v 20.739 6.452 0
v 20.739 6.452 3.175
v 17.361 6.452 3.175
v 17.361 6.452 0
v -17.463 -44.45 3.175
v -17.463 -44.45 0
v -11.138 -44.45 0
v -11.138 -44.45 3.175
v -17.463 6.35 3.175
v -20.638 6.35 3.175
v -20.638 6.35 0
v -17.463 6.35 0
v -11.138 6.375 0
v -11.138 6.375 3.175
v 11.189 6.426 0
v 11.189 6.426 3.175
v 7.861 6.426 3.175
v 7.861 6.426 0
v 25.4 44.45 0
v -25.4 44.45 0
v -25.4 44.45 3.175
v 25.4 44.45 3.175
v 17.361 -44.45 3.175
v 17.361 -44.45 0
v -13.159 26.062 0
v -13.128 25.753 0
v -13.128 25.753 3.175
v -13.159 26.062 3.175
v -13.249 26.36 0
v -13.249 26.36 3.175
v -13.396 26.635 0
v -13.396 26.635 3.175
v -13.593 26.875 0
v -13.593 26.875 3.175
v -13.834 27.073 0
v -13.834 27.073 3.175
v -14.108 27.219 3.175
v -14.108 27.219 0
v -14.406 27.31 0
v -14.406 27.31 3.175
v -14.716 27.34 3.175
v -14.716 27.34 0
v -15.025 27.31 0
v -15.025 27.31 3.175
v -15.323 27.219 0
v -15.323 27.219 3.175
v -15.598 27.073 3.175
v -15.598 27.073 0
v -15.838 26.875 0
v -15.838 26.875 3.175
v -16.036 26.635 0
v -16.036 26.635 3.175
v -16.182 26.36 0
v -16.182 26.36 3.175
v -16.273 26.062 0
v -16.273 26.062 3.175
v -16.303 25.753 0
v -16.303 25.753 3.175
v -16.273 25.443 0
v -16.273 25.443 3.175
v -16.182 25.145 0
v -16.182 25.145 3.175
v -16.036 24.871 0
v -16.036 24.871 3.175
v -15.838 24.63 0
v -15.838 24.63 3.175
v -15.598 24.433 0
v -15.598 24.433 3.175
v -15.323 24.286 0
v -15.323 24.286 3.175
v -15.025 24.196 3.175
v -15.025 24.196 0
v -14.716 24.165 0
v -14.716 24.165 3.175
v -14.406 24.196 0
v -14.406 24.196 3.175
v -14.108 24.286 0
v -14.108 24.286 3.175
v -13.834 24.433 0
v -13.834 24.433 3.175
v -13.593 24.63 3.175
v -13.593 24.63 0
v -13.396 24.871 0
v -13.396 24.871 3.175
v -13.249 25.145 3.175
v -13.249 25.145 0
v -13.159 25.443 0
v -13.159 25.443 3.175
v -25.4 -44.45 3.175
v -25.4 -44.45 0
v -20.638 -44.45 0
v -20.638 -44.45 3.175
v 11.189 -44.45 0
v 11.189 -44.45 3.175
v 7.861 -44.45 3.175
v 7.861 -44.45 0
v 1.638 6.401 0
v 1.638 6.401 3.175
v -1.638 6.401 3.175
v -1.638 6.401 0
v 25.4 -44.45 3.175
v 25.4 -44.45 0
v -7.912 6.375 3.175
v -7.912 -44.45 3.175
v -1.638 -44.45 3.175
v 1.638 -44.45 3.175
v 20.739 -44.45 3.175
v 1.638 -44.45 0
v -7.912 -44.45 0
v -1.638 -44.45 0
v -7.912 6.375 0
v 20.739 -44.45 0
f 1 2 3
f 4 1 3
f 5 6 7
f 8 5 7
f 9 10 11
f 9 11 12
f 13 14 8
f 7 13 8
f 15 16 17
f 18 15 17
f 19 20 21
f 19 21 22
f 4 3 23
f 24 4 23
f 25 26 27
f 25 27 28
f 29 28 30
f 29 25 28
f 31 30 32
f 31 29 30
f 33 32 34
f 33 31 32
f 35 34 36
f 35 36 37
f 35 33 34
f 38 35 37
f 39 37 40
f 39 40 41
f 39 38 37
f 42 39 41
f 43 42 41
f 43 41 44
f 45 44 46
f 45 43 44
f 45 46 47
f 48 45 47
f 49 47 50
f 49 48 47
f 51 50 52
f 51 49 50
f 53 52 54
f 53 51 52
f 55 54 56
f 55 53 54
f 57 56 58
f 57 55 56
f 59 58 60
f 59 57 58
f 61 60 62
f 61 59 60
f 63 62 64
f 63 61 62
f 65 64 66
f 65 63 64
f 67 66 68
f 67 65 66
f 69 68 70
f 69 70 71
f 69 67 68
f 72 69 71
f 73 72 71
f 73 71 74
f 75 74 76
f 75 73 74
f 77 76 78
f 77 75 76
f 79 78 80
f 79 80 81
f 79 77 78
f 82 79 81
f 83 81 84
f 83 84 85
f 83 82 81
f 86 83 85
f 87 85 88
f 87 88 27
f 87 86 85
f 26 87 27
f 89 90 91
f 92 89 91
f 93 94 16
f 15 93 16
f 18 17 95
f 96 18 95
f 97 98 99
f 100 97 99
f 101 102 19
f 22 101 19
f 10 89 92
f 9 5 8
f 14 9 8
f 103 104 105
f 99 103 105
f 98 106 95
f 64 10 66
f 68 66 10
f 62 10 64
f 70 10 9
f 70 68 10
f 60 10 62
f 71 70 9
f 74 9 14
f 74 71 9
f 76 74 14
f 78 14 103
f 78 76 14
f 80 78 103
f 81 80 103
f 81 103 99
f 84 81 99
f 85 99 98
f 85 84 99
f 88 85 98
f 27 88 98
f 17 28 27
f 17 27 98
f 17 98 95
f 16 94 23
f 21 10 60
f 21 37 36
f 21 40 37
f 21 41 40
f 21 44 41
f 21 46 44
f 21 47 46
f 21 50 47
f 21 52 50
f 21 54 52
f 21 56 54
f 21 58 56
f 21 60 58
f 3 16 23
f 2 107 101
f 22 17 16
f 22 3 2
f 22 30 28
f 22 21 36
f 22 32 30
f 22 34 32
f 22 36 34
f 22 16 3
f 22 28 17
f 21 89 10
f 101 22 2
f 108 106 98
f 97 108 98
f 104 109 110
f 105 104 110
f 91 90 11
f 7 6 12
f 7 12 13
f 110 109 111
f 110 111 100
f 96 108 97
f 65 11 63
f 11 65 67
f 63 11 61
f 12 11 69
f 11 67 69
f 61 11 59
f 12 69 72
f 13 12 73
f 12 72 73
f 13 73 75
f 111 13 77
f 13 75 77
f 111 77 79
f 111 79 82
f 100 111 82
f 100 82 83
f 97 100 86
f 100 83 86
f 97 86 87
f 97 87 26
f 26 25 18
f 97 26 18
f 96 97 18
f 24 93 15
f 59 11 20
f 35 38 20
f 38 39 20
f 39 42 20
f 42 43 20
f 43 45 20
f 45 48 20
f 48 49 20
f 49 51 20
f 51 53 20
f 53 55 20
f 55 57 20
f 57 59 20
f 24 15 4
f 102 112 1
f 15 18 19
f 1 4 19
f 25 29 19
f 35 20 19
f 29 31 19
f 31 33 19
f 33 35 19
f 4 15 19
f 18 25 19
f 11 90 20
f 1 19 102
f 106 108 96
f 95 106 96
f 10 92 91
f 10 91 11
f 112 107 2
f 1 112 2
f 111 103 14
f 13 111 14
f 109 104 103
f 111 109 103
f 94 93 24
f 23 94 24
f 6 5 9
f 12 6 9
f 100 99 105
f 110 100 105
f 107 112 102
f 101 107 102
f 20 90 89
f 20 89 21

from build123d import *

# Parameters (mm, degrees)
SKETCH1_W           = 50.8
SKETCH1_H           = 88.9
SKETCH1_R           = 1.5875
BOSS_EXTRUDE1_DEPTH = 3.175
SKETCH2_W           = 3.175
SKETCH2_H           = 50.8
CUT_EXTRUDE1_DEPTH  = 52.293694788
LPATTERN1_COUNT     = 3
LPATTERN1_PITCH     = 9.525
LPATTERN1_COL_COUNT = 3
LPATTERN1_COL_PITCH = 9.525
CUT_EXTRUDE2_DEPTH  = 52.293694788


with BuildPart() as part:
    # Sketch1 → Boss-Extrude1 (new body)
    with BuildSketch(Plane.XY):
        Rectangle(SKETCH1_W, SKETCH1_H)
        with Locations((-14.715789726, 25.75263202)):
            Circle(SKETCH1_R, mode=Mode.SUBTRACT)
    extrude(amount=BOSS_EXTRUDE1_DEPTH)

    # Sketch2 → Cut-Extrude1 (cut, through all)
    with BuildSketch(Plane.XY.offset(3.175)):
        with Locations((0, -19.05)):
            Rectangle(SKETCH2_W, SKETCH2_H)
    cut_extrude1 = extrude(amount=-CUT_EXTRUDE1_DEPTH, mode=Mode.SUBTRACT)

    # LPattern1: Cut-Extrude1 ×3
    with Locations(*[(i * LPATTERN1_PITCH, 0, 0) for i in range(1, LPATTERN1_COUNT)]):
        add(cut_extrude1, mode=Mode.SUBTRACT)

    # LPattern1 col: Cut-Extrude1 ×3
    with Locations(*[(-i * LPATTERN1_COL_PITCH, 0, 0) for i in range(1, LPATTERN1_COL_COUNT)]):
        add(cut_extrude1, mode=Mode.SUBTRACT)

    # Sketch3 → Cut-Extrude2 (cut, through all)
    with BuildSketch(Plane.XY.offset(3.175)):
        Polygon((-11.1379, 6.3754), (-11.1379, -44.45), (-11.1125, -44.45), (-11.1125, 6.35), (-7.9375, 6.35), (-7.9375, -44.45), (-7.9121, -44.45), (-7.9121, 6.3754), align=None)
        Polygon((-1.6383, 6.4008), (-1.6383, -44.45), (-1.5875, -44.45), (-1.5875, 6.35), (1.5875, 6.35), (1.5875, -44.45), (1.6383, -44.45), (1.6383, 6.4008), align=None)
        Polygon((7.8613, 6.4262), (7.8613, -44.45), (7.9375, -44.45), (7.9375, 6.35), (11.1125, 6.35), (11.1125, -44.45), (11.1887, -44.45), (11.1887, 6.4262), align=None)
        Polygon((20.6375, -44.45), (20.7391, -44.45), (20.7391, 6.4516), (17.3609, 6.4516), (17.3609, -44.45), (17.4625, -44.45), (17.4625, 6.35), (20.6375, 6.35), align=None)
    extrude(amount=-CUT_EXTRUDE2_DEPTH, mode=Mode.SUBTRACT)


solid = part.part
